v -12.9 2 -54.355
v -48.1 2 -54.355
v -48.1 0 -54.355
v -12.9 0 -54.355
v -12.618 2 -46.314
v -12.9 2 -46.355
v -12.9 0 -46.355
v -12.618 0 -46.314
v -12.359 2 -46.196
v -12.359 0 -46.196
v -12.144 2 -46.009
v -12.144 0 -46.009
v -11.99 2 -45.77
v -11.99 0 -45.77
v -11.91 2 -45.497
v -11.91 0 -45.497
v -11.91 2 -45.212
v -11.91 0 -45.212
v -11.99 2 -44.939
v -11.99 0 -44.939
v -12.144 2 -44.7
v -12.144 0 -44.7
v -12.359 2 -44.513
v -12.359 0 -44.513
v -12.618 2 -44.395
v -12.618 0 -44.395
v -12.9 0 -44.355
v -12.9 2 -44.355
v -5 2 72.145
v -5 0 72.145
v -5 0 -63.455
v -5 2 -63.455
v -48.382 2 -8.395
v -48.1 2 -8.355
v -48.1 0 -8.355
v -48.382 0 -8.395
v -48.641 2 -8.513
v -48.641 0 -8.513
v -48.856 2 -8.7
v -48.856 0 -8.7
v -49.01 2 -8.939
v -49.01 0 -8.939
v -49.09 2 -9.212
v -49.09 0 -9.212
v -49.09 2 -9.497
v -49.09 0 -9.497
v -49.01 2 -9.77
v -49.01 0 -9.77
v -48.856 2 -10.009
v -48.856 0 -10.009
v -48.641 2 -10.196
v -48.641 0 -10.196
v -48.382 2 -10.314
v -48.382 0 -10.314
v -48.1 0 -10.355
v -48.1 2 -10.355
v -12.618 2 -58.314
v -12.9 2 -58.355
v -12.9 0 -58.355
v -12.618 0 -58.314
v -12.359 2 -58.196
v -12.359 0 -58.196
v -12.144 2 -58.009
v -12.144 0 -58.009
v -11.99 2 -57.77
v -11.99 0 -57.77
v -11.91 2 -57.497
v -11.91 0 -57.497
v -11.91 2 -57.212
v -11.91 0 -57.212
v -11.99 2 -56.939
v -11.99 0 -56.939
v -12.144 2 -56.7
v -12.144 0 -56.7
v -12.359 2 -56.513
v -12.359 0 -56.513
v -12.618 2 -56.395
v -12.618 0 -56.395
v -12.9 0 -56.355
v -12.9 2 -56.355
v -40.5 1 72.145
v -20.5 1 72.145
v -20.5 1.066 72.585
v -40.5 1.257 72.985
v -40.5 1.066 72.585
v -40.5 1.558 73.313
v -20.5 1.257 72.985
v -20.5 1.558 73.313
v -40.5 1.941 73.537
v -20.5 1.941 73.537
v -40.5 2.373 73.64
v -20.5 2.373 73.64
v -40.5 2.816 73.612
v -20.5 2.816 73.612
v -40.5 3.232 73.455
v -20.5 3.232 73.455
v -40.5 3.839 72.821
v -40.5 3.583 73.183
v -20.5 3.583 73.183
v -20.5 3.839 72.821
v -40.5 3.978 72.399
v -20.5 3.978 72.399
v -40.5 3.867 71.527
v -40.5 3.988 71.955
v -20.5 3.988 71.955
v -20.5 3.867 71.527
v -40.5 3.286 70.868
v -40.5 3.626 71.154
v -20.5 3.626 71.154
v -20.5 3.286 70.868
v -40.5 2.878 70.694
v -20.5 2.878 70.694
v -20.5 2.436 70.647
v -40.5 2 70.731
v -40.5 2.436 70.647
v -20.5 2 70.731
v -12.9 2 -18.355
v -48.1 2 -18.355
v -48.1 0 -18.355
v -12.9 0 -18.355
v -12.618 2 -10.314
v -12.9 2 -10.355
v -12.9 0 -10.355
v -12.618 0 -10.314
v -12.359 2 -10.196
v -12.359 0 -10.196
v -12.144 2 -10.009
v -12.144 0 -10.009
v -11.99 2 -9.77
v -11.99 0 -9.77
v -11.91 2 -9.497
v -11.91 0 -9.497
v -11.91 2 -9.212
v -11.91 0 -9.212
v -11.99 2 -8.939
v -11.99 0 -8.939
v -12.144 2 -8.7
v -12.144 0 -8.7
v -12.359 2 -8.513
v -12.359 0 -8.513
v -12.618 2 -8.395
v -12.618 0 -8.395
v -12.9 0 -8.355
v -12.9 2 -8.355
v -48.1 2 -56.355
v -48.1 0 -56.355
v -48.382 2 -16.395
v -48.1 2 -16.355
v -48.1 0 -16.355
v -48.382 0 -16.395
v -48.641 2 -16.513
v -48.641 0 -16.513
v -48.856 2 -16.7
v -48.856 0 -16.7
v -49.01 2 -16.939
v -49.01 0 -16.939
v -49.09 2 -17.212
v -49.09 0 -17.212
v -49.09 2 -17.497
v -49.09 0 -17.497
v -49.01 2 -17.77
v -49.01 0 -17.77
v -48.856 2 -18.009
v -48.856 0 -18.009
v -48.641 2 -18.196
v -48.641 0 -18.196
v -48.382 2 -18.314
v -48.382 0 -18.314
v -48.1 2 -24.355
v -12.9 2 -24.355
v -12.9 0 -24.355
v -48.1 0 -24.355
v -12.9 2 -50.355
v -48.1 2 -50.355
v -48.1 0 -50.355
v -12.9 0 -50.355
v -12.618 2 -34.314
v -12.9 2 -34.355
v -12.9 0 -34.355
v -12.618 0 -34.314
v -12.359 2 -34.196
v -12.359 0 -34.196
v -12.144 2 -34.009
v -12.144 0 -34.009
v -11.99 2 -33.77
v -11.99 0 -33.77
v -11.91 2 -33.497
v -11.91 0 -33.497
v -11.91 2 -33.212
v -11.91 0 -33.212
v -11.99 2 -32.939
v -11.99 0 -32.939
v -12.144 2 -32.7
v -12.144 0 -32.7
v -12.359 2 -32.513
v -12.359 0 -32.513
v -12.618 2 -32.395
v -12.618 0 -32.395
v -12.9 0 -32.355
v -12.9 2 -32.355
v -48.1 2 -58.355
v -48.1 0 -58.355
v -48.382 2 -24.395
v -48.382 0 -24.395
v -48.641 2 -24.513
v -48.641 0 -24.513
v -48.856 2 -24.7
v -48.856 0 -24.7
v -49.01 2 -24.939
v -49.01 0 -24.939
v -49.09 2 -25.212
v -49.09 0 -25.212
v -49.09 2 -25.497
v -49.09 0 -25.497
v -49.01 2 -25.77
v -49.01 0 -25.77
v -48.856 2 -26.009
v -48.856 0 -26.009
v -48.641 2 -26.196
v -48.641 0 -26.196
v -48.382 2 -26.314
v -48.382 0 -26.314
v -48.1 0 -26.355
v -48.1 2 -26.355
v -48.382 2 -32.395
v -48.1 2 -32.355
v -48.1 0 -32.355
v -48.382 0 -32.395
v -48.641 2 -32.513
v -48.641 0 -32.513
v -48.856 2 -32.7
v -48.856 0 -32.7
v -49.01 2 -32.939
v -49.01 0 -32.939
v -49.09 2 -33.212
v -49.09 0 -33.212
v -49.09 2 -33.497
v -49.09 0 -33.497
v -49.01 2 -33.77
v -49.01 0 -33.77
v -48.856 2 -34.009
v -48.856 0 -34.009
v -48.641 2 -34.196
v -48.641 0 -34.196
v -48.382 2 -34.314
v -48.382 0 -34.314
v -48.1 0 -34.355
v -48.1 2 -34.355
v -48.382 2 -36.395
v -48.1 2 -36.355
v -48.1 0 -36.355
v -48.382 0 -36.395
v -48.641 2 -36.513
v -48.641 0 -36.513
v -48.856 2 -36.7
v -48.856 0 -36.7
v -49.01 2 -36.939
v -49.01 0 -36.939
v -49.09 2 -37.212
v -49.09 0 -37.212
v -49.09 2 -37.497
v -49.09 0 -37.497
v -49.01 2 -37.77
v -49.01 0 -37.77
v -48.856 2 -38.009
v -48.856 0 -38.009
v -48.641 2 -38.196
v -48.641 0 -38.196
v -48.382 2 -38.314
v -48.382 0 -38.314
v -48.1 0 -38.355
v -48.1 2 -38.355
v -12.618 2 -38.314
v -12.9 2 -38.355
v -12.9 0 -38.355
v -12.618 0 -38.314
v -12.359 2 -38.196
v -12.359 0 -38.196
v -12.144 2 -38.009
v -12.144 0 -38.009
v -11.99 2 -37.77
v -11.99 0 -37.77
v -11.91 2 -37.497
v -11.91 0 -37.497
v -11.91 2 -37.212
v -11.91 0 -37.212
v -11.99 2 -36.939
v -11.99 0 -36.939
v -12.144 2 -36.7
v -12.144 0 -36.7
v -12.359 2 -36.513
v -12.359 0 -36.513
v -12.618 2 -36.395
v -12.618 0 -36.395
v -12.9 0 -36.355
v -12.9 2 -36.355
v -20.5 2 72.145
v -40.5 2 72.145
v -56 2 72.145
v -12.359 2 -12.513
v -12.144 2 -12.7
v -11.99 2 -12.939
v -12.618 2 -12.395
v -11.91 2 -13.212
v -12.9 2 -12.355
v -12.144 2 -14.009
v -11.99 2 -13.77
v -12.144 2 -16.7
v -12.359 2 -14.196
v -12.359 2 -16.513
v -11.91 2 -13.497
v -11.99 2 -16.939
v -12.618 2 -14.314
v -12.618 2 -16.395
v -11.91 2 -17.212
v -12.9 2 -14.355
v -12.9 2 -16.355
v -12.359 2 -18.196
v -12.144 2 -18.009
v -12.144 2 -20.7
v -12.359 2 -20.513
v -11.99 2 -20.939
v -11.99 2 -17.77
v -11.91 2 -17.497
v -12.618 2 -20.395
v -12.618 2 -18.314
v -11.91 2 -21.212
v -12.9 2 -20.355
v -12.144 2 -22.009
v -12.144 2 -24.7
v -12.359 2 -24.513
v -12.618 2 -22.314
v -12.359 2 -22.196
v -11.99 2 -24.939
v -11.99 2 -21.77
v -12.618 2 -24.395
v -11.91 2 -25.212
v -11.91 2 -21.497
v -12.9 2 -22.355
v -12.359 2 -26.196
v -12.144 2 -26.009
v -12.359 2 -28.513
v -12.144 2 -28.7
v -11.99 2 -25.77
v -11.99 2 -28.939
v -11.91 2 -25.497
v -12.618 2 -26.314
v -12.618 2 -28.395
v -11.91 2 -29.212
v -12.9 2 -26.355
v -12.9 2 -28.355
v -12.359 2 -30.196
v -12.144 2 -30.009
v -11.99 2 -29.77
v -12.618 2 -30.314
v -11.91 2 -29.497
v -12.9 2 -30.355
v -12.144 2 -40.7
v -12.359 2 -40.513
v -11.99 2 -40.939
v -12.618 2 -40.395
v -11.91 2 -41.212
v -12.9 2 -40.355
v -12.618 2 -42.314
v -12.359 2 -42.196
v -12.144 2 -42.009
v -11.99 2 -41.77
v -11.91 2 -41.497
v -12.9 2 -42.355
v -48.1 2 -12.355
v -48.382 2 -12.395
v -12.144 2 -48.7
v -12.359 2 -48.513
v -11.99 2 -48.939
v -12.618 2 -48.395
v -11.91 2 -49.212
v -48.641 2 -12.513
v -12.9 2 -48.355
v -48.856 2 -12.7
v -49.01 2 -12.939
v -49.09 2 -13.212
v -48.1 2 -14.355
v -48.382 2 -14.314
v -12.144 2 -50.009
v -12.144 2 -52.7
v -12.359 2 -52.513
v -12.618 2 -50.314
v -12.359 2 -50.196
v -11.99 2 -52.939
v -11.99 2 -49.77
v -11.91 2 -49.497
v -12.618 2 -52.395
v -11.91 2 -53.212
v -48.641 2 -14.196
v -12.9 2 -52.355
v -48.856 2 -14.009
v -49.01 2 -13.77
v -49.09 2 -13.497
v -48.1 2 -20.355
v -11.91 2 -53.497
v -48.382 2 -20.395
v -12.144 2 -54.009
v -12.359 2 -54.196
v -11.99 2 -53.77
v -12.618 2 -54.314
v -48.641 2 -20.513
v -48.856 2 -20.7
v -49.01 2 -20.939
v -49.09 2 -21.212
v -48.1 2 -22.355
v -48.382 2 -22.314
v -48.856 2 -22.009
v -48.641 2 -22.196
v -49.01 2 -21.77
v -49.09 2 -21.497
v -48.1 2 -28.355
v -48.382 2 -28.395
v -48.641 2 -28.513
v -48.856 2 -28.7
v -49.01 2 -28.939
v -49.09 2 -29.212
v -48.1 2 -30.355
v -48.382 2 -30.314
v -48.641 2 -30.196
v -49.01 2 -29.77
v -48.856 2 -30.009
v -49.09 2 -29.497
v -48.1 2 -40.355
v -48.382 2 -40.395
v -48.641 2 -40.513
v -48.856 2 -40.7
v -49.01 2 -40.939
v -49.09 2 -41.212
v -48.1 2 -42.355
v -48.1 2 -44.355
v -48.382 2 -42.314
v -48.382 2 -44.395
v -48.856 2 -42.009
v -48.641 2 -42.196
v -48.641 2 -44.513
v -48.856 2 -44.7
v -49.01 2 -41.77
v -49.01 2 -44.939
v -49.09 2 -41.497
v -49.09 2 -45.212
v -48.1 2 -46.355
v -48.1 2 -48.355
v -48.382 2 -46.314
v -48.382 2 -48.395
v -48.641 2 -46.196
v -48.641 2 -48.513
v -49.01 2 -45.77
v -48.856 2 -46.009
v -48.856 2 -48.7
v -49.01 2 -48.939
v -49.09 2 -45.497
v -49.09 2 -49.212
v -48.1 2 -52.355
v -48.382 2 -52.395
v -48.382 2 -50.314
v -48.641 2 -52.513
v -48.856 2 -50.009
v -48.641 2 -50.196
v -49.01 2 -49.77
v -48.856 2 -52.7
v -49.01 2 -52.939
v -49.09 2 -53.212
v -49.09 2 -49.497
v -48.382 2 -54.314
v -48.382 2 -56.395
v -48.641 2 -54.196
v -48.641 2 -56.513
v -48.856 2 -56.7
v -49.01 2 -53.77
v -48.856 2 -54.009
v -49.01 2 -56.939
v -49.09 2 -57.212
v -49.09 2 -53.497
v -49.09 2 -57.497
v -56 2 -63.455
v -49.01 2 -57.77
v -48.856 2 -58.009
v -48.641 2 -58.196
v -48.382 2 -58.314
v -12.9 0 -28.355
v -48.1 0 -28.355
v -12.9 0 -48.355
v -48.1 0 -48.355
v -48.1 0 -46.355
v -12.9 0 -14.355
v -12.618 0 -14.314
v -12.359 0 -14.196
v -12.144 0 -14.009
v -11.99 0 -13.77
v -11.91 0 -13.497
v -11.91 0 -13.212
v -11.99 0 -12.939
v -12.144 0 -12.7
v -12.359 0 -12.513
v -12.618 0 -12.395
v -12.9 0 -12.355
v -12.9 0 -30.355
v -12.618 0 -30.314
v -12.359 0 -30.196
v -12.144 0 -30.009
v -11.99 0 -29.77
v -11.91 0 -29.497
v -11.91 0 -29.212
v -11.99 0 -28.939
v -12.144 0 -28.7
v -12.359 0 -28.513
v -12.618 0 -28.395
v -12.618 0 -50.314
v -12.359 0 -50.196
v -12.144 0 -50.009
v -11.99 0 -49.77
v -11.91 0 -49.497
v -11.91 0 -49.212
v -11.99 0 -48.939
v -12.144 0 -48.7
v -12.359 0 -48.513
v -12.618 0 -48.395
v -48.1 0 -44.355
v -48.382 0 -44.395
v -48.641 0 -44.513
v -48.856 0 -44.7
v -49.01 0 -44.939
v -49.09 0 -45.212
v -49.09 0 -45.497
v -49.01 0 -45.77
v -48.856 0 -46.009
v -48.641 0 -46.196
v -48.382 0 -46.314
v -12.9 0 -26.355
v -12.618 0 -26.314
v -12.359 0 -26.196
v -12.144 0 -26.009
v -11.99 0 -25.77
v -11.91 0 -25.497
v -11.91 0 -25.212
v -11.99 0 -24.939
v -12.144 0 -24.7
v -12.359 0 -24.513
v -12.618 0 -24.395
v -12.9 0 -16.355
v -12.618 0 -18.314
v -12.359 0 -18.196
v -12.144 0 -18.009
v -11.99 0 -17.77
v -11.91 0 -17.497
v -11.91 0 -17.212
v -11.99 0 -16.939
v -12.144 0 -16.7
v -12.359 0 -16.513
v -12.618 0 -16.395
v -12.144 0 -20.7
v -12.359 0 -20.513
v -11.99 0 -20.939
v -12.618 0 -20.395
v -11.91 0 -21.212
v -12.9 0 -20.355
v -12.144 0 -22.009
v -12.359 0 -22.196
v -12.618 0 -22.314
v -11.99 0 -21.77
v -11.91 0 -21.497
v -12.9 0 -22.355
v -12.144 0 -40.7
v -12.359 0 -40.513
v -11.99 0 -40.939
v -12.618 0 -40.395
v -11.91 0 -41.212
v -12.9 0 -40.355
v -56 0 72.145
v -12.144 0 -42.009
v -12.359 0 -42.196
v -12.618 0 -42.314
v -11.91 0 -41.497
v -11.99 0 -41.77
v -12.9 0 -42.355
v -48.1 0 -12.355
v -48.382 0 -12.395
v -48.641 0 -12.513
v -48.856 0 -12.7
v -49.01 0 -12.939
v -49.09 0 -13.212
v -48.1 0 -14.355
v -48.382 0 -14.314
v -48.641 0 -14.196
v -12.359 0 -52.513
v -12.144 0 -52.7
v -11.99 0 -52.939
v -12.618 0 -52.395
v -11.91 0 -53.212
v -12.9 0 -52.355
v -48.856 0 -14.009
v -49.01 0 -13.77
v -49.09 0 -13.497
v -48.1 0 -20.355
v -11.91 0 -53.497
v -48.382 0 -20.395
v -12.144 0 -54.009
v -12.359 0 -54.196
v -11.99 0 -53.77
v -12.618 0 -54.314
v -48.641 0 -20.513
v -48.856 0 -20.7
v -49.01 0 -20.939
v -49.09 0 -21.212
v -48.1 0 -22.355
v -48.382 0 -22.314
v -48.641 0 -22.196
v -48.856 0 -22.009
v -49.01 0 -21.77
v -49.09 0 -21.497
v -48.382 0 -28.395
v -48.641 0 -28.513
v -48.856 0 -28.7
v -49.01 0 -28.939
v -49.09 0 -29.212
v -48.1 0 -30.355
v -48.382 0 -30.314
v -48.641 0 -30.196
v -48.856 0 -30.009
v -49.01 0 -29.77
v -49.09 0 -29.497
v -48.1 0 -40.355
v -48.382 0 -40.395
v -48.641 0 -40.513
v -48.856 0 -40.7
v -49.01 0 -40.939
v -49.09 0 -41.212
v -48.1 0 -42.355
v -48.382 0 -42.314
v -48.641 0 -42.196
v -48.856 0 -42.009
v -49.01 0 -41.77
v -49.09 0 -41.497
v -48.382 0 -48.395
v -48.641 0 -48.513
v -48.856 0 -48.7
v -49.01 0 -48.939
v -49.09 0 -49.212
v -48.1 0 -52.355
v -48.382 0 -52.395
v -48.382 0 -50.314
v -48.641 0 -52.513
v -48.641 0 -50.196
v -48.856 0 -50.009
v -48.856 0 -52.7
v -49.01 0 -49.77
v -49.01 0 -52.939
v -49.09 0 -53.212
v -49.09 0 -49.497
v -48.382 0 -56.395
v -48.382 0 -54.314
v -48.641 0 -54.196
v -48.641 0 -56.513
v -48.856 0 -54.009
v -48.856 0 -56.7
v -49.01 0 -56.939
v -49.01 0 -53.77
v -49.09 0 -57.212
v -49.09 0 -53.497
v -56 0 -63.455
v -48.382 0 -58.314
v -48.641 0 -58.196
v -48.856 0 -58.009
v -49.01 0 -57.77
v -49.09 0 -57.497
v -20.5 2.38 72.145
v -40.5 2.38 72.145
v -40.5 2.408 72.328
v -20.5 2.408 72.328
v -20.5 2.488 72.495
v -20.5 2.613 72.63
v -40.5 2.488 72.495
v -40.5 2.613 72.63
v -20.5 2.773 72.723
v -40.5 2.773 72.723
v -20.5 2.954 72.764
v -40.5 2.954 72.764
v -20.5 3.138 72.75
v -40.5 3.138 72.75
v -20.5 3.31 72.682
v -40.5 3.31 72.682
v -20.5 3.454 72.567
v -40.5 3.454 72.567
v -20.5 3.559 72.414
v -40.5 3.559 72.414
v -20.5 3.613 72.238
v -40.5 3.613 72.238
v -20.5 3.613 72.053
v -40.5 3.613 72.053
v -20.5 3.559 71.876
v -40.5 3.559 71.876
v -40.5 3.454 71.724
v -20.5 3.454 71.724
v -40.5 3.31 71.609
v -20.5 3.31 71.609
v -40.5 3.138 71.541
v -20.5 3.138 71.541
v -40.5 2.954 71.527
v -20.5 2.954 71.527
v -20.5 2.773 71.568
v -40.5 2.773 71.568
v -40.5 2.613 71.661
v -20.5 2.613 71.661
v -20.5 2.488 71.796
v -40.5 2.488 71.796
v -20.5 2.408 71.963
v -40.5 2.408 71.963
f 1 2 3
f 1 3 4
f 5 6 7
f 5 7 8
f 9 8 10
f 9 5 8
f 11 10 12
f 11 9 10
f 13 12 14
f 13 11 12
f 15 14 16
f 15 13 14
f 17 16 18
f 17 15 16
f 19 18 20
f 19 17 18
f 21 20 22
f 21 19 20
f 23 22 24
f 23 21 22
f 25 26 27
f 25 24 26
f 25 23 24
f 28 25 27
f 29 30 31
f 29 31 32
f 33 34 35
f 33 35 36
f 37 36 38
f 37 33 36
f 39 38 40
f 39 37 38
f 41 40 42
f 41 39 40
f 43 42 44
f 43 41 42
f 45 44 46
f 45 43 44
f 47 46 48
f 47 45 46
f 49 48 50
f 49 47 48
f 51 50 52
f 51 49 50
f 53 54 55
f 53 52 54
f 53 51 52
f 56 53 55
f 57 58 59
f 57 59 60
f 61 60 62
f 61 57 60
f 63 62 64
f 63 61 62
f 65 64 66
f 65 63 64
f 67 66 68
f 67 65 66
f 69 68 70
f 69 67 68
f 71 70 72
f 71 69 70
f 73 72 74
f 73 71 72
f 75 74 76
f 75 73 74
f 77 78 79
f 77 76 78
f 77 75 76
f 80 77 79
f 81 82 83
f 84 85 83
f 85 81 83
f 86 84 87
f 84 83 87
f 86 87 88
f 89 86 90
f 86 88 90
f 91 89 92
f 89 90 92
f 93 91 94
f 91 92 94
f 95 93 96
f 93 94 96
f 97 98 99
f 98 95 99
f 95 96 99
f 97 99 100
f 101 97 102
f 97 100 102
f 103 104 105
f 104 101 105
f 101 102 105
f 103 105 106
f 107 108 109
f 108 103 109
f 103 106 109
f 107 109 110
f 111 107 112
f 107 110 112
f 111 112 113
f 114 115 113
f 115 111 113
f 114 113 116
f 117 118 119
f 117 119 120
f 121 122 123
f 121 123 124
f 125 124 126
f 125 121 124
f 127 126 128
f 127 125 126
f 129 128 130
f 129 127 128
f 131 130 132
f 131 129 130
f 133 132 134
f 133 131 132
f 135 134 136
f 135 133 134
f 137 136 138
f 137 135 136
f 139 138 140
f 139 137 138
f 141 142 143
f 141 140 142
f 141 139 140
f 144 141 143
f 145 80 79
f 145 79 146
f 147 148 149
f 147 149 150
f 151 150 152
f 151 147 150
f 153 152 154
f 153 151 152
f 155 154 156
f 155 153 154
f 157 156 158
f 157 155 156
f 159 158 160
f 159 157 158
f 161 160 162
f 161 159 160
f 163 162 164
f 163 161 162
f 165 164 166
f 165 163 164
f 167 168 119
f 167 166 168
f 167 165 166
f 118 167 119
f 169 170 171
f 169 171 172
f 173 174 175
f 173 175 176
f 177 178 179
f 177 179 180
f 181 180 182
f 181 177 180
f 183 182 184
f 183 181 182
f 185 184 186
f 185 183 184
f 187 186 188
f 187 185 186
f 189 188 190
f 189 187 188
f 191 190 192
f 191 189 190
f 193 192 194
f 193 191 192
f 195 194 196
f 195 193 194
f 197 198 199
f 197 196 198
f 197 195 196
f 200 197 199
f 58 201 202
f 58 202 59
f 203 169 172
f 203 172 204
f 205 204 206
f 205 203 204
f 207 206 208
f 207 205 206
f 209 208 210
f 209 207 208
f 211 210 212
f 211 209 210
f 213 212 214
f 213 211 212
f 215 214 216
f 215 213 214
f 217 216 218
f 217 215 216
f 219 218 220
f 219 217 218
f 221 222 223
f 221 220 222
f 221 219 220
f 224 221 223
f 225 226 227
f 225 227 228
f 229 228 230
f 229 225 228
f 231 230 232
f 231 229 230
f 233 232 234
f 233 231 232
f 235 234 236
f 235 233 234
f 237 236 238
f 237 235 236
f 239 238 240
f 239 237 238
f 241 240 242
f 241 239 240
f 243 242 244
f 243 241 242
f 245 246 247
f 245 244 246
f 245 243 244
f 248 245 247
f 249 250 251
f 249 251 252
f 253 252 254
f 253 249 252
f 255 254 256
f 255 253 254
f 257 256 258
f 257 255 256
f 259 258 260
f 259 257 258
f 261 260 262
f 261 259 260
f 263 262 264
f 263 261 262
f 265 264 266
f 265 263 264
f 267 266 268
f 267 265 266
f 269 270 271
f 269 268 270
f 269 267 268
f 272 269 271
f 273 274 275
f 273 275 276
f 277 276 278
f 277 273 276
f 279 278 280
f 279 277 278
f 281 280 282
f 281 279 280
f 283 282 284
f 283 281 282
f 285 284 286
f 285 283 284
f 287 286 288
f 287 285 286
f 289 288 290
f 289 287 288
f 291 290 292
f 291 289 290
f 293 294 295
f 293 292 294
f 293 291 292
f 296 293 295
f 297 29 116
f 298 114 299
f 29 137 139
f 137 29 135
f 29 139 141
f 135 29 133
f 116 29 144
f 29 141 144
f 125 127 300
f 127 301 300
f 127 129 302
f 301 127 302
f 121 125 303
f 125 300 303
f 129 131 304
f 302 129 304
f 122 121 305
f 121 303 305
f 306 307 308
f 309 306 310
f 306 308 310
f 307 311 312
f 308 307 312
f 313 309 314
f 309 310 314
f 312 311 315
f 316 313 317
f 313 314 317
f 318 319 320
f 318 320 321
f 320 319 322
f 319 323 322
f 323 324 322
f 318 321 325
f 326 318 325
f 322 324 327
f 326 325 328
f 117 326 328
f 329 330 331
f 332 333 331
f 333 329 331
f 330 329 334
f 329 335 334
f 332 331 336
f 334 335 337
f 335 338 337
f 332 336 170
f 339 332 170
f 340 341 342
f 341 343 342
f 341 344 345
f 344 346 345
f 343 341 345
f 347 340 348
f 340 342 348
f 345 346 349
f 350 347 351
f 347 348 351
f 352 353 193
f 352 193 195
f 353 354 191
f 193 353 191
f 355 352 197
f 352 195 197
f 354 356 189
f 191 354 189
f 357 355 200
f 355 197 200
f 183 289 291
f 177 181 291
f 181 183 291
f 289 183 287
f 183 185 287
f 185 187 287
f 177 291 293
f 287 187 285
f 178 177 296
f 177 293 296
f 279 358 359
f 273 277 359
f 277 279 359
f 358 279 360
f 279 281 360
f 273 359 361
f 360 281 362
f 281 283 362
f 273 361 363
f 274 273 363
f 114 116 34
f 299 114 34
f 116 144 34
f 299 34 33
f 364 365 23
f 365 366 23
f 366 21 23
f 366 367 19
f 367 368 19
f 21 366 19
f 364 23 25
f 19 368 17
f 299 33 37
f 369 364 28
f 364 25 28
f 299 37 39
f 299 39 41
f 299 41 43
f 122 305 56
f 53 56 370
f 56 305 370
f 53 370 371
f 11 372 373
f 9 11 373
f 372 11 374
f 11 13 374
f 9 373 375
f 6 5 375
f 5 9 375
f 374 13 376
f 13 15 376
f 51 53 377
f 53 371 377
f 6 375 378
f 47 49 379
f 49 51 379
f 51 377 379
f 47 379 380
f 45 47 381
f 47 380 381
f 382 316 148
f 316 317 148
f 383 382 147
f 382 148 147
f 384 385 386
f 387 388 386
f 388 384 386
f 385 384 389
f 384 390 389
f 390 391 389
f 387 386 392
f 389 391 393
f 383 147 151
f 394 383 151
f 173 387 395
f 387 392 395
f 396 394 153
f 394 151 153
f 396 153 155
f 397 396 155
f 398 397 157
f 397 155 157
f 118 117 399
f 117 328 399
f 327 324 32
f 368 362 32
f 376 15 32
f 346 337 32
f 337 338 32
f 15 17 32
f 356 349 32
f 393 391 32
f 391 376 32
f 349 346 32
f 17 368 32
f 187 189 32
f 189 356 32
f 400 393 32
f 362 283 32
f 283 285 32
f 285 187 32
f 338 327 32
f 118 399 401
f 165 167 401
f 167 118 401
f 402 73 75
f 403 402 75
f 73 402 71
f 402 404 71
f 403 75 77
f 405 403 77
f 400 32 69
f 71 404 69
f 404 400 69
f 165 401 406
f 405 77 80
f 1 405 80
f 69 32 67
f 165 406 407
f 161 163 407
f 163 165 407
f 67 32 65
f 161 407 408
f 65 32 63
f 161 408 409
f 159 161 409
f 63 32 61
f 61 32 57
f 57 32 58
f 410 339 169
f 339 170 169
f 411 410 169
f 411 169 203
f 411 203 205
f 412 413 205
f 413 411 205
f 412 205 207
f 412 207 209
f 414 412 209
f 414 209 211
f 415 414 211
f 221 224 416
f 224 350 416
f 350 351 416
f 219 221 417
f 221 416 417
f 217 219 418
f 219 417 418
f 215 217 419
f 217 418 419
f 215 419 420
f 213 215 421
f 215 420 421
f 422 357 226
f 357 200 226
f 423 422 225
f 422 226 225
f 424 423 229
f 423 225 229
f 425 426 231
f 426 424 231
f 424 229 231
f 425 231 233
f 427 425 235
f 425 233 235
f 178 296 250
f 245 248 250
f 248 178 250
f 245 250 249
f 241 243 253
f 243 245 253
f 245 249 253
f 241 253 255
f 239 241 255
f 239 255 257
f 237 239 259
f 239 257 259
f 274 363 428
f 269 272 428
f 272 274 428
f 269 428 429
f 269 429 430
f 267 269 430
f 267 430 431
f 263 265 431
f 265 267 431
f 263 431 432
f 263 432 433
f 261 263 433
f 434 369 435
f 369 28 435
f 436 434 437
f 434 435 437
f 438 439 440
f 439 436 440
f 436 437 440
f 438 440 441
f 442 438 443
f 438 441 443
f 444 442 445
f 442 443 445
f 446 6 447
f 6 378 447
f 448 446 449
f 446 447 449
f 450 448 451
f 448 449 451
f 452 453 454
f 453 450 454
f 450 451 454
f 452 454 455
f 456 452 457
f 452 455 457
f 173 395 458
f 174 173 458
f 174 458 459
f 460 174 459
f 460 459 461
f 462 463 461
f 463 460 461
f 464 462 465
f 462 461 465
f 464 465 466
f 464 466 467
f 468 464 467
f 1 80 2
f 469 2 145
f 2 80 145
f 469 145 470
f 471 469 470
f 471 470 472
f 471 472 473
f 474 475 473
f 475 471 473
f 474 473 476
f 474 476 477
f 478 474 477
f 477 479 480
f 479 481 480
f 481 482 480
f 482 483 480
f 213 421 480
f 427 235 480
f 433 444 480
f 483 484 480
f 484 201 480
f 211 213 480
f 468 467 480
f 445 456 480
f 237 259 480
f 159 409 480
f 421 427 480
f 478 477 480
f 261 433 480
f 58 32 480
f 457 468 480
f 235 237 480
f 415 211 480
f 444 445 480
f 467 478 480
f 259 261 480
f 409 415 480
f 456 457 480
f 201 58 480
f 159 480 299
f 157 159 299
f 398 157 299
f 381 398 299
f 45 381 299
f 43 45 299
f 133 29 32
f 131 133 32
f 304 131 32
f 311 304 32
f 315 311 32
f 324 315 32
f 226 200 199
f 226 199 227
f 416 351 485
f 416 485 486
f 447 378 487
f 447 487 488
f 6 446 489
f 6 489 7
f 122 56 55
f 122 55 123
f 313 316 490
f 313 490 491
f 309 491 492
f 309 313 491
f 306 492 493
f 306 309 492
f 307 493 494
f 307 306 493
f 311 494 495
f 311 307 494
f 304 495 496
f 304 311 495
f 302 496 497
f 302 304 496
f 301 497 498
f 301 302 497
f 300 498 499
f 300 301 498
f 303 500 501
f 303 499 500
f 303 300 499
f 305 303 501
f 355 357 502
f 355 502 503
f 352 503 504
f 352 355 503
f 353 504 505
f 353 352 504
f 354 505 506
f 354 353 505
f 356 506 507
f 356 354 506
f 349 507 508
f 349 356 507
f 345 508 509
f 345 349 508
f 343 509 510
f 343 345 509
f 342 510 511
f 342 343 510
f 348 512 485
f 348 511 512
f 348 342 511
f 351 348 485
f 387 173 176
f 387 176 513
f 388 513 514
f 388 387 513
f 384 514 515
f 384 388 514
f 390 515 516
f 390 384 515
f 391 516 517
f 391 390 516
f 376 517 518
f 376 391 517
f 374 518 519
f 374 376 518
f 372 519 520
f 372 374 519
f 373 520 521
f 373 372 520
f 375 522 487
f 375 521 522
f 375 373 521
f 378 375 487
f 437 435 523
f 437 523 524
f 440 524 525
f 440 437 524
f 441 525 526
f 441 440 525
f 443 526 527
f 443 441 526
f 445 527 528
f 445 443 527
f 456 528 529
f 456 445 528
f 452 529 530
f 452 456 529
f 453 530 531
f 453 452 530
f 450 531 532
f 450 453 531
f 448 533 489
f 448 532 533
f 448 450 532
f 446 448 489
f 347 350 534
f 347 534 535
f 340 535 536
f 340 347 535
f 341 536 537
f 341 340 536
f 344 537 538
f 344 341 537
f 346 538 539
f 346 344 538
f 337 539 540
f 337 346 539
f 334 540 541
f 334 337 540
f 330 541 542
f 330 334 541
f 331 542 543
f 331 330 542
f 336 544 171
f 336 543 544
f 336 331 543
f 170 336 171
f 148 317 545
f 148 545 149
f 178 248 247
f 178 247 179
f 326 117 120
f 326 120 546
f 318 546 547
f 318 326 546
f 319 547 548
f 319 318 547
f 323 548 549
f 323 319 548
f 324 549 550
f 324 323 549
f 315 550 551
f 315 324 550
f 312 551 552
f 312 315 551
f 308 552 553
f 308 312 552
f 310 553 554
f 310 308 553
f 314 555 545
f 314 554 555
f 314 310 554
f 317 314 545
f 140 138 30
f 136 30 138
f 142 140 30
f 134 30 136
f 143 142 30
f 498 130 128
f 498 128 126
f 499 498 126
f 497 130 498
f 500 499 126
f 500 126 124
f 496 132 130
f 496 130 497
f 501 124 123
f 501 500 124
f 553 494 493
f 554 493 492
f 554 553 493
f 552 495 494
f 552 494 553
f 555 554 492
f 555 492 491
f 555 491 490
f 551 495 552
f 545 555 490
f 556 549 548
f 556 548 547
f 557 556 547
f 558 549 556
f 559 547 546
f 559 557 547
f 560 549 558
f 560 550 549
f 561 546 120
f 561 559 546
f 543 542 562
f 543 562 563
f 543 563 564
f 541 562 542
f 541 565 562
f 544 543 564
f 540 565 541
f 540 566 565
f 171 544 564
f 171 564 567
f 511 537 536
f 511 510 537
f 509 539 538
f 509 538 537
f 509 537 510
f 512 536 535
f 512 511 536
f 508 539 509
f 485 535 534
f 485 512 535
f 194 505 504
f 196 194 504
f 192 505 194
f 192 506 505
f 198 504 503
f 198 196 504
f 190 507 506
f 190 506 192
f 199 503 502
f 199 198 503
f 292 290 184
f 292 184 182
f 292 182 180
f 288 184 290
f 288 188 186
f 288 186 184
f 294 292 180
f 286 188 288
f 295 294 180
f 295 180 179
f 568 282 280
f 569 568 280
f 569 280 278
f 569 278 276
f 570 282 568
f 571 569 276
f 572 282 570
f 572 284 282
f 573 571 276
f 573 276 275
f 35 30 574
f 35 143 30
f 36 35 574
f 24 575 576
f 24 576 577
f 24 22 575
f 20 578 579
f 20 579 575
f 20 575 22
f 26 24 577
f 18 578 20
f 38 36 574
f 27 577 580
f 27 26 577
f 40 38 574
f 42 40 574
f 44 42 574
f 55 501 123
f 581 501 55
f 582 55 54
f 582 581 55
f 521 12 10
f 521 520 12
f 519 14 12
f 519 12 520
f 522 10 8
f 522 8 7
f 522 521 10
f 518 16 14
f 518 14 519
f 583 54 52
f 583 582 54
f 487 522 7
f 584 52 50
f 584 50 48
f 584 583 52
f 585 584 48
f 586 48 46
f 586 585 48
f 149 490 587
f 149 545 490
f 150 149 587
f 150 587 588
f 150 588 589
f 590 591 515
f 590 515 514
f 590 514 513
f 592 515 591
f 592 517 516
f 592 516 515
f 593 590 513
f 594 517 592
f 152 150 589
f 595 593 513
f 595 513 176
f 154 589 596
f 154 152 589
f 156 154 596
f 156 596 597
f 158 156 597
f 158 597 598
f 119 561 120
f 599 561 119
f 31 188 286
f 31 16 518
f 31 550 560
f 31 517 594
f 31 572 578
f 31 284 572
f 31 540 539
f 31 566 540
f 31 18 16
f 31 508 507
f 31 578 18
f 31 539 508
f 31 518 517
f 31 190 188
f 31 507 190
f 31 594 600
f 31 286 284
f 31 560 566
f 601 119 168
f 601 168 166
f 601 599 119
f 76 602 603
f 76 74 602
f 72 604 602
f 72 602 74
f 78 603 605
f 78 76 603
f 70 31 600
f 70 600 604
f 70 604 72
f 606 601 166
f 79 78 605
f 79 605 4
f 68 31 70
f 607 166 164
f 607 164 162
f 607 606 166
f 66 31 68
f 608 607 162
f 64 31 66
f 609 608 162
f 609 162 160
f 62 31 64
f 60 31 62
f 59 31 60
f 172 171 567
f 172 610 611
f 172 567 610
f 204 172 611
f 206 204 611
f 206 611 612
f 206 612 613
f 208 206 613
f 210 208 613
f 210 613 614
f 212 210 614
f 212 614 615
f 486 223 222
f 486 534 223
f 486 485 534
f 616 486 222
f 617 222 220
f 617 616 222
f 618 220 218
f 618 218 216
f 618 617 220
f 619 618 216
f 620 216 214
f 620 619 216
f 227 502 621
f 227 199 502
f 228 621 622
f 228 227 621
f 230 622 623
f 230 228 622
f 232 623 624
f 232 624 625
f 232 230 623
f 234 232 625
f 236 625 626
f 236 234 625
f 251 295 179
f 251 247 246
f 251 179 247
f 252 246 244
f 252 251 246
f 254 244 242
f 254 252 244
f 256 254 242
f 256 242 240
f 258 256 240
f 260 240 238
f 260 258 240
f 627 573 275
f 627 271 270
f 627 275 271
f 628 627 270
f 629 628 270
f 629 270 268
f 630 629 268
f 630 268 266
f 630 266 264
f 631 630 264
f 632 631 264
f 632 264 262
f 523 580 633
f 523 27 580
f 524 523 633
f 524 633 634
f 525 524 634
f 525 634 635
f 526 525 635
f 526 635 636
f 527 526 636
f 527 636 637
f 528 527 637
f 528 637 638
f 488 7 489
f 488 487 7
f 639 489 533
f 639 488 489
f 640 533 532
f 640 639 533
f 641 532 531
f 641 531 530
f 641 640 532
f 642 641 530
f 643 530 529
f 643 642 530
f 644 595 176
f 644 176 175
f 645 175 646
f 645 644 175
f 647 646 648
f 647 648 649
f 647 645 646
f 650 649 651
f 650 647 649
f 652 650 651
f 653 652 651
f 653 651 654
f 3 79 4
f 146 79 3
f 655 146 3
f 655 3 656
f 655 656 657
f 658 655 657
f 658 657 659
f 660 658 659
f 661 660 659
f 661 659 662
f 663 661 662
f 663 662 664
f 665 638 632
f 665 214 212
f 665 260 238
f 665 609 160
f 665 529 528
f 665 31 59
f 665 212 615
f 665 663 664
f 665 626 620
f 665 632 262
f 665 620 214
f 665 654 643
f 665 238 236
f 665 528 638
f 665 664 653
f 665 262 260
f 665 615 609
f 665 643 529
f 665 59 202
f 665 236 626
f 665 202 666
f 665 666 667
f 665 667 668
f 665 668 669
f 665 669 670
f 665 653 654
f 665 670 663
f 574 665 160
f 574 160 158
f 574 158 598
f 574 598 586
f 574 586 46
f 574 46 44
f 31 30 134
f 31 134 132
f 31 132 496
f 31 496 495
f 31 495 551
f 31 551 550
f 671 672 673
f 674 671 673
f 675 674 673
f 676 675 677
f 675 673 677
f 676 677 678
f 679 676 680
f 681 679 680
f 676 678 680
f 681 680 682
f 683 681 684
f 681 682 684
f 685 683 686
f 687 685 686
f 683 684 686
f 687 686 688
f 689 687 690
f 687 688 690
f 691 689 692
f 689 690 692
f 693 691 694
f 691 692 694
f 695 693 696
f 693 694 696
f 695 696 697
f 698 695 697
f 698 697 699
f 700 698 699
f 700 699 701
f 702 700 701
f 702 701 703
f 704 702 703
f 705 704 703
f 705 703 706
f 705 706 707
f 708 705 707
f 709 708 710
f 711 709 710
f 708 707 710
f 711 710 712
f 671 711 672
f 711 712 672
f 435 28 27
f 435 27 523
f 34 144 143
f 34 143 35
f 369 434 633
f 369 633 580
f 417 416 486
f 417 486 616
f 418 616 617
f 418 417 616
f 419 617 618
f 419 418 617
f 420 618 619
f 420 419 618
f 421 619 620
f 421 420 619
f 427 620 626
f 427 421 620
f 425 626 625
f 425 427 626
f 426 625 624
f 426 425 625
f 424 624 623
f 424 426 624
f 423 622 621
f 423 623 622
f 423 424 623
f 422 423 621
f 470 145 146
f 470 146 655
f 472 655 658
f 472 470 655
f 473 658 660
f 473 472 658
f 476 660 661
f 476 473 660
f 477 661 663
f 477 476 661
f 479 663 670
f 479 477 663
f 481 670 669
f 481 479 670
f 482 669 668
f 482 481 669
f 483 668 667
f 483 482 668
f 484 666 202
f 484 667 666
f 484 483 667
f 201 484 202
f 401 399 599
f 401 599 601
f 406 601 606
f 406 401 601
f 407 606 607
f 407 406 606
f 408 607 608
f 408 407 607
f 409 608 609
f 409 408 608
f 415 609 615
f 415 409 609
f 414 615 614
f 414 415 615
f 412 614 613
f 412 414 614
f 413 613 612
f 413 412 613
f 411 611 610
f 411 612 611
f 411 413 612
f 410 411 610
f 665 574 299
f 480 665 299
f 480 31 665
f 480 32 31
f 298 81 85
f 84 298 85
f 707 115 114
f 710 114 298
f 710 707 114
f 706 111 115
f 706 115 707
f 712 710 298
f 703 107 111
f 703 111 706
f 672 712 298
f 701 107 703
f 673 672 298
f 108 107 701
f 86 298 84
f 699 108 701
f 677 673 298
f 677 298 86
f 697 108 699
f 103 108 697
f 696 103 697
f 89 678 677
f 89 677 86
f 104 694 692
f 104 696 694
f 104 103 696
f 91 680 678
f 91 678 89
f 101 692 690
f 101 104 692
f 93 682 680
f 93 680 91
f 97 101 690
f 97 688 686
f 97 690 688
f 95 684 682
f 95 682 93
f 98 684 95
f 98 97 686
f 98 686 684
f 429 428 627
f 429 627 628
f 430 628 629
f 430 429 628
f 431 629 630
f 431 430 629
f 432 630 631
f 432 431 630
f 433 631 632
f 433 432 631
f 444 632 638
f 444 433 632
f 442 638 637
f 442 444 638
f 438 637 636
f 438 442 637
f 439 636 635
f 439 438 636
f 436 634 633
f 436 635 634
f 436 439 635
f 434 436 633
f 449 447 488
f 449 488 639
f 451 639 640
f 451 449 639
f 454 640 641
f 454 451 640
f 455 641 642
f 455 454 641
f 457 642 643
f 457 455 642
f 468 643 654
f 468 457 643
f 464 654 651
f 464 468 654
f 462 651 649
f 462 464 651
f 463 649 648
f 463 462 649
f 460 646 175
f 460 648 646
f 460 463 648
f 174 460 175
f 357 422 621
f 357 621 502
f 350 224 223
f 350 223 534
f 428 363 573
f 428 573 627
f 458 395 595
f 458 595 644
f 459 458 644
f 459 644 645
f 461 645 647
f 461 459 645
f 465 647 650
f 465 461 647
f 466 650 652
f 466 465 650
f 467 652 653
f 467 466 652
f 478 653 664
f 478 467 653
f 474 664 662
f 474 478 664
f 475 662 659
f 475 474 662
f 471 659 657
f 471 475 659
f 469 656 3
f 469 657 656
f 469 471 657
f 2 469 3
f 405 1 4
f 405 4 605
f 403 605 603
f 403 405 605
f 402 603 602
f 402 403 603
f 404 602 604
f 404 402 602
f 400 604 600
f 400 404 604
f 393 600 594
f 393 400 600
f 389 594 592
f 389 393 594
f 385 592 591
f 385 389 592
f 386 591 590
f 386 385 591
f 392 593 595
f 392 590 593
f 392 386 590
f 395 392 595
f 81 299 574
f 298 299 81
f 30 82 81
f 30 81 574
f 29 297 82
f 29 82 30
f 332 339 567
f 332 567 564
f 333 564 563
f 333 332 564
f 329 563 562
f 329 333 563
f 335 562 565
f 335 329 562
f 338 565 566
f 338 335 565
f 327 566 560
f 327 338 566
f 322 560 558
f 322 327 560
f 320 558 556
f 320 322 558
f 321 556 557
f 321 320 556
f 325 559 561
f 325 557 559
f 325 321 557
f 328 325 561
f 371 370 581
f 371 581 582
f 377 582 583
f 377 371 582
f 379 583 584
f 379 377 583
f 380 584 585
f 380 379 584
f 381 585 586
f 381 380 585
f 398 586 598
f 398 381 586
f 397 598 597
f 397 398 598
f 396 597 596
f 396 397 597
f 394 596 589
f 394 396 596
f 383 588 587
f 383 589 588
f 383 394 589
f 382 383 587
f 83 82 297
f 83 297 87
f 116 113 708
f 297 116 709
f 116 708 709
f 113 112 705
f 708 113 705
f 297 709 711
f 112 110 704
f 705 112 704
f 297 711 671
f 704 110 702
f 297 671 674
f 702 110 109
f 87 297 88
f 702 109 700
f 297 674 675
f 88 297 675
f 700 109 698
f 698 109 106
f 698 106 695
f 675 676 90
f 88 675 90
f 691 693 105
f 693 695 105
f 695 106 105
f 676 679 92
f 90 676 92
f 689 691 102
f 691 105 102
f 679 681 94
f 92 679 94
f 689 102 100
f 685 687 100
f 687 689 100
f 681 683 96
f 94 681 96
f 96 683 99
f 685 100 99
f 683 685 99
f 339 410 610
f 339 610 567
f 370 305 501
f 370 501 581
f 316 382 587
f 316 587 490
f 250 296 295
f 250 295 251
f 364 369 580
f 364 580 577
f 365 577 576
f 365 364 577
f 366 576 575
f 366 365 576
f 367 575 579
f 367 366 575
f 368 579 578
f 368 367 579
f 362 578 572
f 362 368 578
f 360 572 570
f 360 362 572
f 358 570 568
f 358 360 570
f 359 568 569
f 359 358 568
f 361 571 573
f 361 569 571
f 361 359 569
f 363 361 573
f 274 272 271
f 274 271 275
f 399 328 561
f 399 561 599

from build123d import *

# Parameters (mm, degrees)
SKETCH1_W                = 51
SKETCH1_H                = 136
BOSS_EXTRUDE1_DEPTH      = 2
CUT_EXTRUDE1_DEPTH       = 10
SKETCH5_W                = 1
SKETCH5_H                = 2
BOSS_EXTRUDE2_DEPTH      = 136
SKETCH6_W                = 1
SKETCH6_H                = 2
BOSS_EXTRUDE3_DEPTH      = 136
SKETCH7_W                = 68.795835126
SKETCH7_H                = 26.425628728
CUT_EXTRUDE2_DEPTH       = 0.4
SKETCH8_W                = 2
SKETCH8_H                = 2
CUT_EXTRUDE3_DEPTH       = 135.6
BOSS_EXTRUDE6_DEPTH      = 10
BOSS_EXTRUDE6_DEPTH_BACK = 10
SKETCH11_R               = 1.5
SKETCH14_R               = 0.62
CUT_EXTRUDE5_DEPTH       = 20


with BuildPart() as part:
    # Sketch1 → Boss-Extrude1 (new body)
    with BuildSketch(Plane(origin=(0, 0, 0), x_dir=(1, 0, 0), z_dir=(0, 1, 0))):
        with Locations((-30.5, -4.545454545)):
            Rectangle(SKETCH1_W, SKETCH1_H)
    extrude(amount=BOSS_EXTRUDE1_DEPTH)

    # Sketch4 → Cut-Extrude1 (cut)
    with BuildSketch(Plane(origin=(0, 2, 0), x_dir=(1, 0, 0), z_dir=(0, 1, 0))):
        with BuildLine():
            Line((-48.1, 58.354545455), (-12.9, 58.354545455))
            ThreePointArc((-12.9, 58.354545455), (-11.9, 57.354545455), (-12.9, 56.354545455))
            Line((-12.9, 56.354545455), (-48.1, 56.354545455))
            ThreePointArc((-48.1, 56.354545455), (-49.1, 57.354545455), (-48.1, 58.354545455))
        make_face()
        with BuildLine():
            Line((-48.1, 54.354545455), (-12.9, 54.354545455))
            ThreePointArc((-12.9, 54.354545455), (-11.9, 53.354545455), (-12.9, 52.354545455))
            Line((-12.9, 52.354545455), (-48.1, 52.354545455))
            ThreePointArc((-48.1, 52.354545455), (-49.1, 53.354545455), (-48.1, 54.354545455))
        make_face()
        with BuildLine():
            Line((-48.1, 50.354545455), (-12.9, 50.354545455))
            ThreePointArc((-12.9, 50.354545455), (-11.9, 49.354545455), (-12.9, 48.354545455))
            Line((-12.9, 48.354545455), (-48.1, 48.354545455))
            ThreePointArc((-48.1, 48.354545455), (-49.1, 49.354545455), (-48.1, 50.354545455))
        make_face()
        with BuildLine():
            Line((-48.1, 46.354545455), (-12.9, 46.354545455))
            ThreePointArc((-12.9, 46.354545455), (-11.9, 45.354545455), (-12.9, 44.354545455))
            Line((-12.9, 44.354545455), (-48.1, 44.354545455))
            ThreePointArc((-48.1, 44.354545455), (-49.1, 45.354545455), (-48.1, 46.354545455))
        make_face()
        with BuildLine():
            Line((-48.1, 42.354545455), (-12.9, 42.354545455))
            ThreePointArc((-12.9, 42.354545455), (-11.9, 41.354545455), (-12.9, 40.354545455))
            Line((-12.9, 40.354545455), (-48.1, 40.354545455))
            ThreePointArc((-48.1, 40.354545455), (-49.1, 41.354545455), (-48.1, 42.354545455))
        make_face()
        with BuildLine():
            Line((-48.1, 38.354545455), (-12.9, 38.354545455))
            ThreePointArc((-12.9, 38.354545455), (-11.9, 37.354545455), (-12.9, 36.354545455))
            Line((-12.9, 36.354545455), (-48.1, 36.354545455))
            ThreePointArc((-48.1, 36.354545455), (-49.1, 37.354545455), (-48.1, 38.354545455))
        make_face()
        with BuildLine():
            Line((-48.1, 34.354545455), (-12.9, 34.354545455))
            ThreePointArc((-12.9, 34.354545455), (-11.9, 33.354545455), (-12.9, 32.354545455))
            Line((-12.9, 32.354545455), (-48.1, 32.354545455))
            ThreePointArc((-48.1, 32.354545455), (-49.1, 33.354545455), (-48.1, 34.354545455))
        make_face()
        with BuildLine():
            Line((-48.1, 30.354545455), (-12.9, 30.354545455))
            ThreePointArc((-12.9, 30.354545455), (-11.9, 29.354545455), (-12.9, 28.354545455))
            Line((-12.9, 28.354545455), (-48.1, 28.354545455))
            ThreePointArc((-48.1, 28.354545455), (-49.1, 29.354545455), (-48.1, 30.354545455))
        make_face()
        with BuildLine():
            Line((-48.1, 26.354545455), (-12.9, 26.354545455))
            ThreePointArc((-12.9, 26.354545455), (-11.9, 25.354545455), (-12.9, 24.354545455))
            Line((-12.9, 24.354545455), (-48.1, 24.354545455))
            ThreePointArc((-48.1, 24.354545455), (-49.1, 25.354545455), (-48.1, 26.354545455))
        make_face()
        with BuildLine():
            Line((-48.1, 22.354545455), (-12.9, 22.354545455))
            ThreePointArc((-12.9, 22.354545455), (-11.9, 21.354545455), (-12.9, 20.354545455))
            Line((-12.9, 20.354545455), (-48.1, 20.354545455))
            ThreePointArc((-48.1, 20.354545455), (-49.1, 21.354545455), (-48.1, 22.354545455))
        make_face()
        with BuildLine():
            Line((-48.1, 18.354545455), (-12.9, 18.354545455))
            ThreePointArc((-12.9, 18.354545455), (-11.9, 17.354545455), (-12.9, 16.354545455))
            Line((-12.9, 16.354545455), (-48.1, 16.354545455))
            ThreePointArc((-48.1, 16.354545455), (-49.1, 17.354545455), (-48.1, 18.354545455))
        make_face()
        with BuildLine():
            Line((-48.1, 14.354545455), (-12.9, 14.354545455))
            ThreePointArc((-12.9, 14.354545455), (-11.9, 13.354545455), (-12.9, 12.354545455))
            Line((-12.9, 12.354545455), (-48.1, 12.354545455))
            ThreePointArc((-48.1, 12.354545455), (-49.1, 13.354545455), (-48.1, 14.354545455))
        make_face()
        with BuildLine():
            Line((-48.1, 10.354545455), (-12.9, 10.354545455))
            ThreePointArc((-12.9, 10.354545455), (-11.9, 9.354545455), (-12.9, 8.354545455))
            Line((-12.9, 8.354545455), (-48.1, 8.354545455))
            ThreePointArc((-48.1, 8.354545455), (-49.1, 9.354545455), (-48.1, 10.354545455))
        make_face()
    extrude(amount=-CUT_EXTRUDE1_DEPTH, mode=Mode.SUBTRACT)

    # Sketch5 → Boss-Extrude2 (add)
    with BuildSketch(Plane(origin=(0, 0, -63.454545455), x_dir=(-1, 0, 0), z_dir=(0, 0, -1))):
        with Locations((56.5, 1)):
            Rectangle(SKETCH5_W, SKETCH5_H)
        with Locations((4.5, 1)):
            Rectangle(SKETCH5_W, SKETCH5_H)
    extrude(amount=-BOSS_EXTRUDE2_DEPTH)

    # Sketch6 → Boss-Extrude3 (add)
    with BuildSketch(Plane(origin=(0, 0, -63.454545455), x_dir=(-1, 0, 0), z_dir=(0, 0, -1))):
        with Locations((57.5, 1)):
            Rectangle(SKETCH6_W, SKETCH6_H)
        with Locations((3.5, 1)):
            Rectangle(SKETCH6_W, SKETCH6_H)
    extrude(amount=-BOSS_EXTRUDE3_DEPTH)

    # Sketch7 → Cut-Extrude2 (cut)
    with BuildSketch(Plane.XY.offset(72.545454545)):
        with Locations((-32.339758962, -3.400766566)):
            Rectangle(SKETCH7_W, SKETCH7_H)
    extrude(amount=-CUT_EXTRUDE2_DEPTH, mode=Mode.SUBTRACT)

    # Sketch8 → Cut-Extrude3 (cut)
    with BuildSketch(Plane(origin=(0, 0, -63.454545455), x_dir=(-1, 0, 0), z_dir=(0, 0, -1))):
        with Locations((4, 1)):
            Rectangle(SKETCH8_W, SKETCH8_H)
        with Locations((57, 1)):
            Rectangle(SKETCH8_W, SKETCH8_H)
    extrude(amount=-CUT_EXTRUDE3_DEPTH, mode=Mode.SUBTRACT)

    # Sketch11 → Boss-Extrude6 (add, two sides: drawn at the far end of the back side and taken through both)
    with BuildSketch(Plane.ZY.offset(30.5).offset(-BOSS_EXTRUDE6_DEPTH_BACK)):
        with Locations((72.145454545, 2.5)):
            Circle(SKETCH11_R)
    extrude(amount=BOSS_EXTRUDE6_DEPTH + BOSS_EXTRUDE6_DEPTH_BACK)

    # Sketch14 → Cut-Extrude5 (cut)
    with BuildSketch(Plane.ZY.offset(40.5)):
        with Locations(Location((72.145454545, 3, 0), (0, 0, 270))):
            Circle(SKETCH14_R)
    extrude(amount=-CUT_EXTRUDE5_DEPTH, mode=Mode.SUBTRACT)


solid = part.part
